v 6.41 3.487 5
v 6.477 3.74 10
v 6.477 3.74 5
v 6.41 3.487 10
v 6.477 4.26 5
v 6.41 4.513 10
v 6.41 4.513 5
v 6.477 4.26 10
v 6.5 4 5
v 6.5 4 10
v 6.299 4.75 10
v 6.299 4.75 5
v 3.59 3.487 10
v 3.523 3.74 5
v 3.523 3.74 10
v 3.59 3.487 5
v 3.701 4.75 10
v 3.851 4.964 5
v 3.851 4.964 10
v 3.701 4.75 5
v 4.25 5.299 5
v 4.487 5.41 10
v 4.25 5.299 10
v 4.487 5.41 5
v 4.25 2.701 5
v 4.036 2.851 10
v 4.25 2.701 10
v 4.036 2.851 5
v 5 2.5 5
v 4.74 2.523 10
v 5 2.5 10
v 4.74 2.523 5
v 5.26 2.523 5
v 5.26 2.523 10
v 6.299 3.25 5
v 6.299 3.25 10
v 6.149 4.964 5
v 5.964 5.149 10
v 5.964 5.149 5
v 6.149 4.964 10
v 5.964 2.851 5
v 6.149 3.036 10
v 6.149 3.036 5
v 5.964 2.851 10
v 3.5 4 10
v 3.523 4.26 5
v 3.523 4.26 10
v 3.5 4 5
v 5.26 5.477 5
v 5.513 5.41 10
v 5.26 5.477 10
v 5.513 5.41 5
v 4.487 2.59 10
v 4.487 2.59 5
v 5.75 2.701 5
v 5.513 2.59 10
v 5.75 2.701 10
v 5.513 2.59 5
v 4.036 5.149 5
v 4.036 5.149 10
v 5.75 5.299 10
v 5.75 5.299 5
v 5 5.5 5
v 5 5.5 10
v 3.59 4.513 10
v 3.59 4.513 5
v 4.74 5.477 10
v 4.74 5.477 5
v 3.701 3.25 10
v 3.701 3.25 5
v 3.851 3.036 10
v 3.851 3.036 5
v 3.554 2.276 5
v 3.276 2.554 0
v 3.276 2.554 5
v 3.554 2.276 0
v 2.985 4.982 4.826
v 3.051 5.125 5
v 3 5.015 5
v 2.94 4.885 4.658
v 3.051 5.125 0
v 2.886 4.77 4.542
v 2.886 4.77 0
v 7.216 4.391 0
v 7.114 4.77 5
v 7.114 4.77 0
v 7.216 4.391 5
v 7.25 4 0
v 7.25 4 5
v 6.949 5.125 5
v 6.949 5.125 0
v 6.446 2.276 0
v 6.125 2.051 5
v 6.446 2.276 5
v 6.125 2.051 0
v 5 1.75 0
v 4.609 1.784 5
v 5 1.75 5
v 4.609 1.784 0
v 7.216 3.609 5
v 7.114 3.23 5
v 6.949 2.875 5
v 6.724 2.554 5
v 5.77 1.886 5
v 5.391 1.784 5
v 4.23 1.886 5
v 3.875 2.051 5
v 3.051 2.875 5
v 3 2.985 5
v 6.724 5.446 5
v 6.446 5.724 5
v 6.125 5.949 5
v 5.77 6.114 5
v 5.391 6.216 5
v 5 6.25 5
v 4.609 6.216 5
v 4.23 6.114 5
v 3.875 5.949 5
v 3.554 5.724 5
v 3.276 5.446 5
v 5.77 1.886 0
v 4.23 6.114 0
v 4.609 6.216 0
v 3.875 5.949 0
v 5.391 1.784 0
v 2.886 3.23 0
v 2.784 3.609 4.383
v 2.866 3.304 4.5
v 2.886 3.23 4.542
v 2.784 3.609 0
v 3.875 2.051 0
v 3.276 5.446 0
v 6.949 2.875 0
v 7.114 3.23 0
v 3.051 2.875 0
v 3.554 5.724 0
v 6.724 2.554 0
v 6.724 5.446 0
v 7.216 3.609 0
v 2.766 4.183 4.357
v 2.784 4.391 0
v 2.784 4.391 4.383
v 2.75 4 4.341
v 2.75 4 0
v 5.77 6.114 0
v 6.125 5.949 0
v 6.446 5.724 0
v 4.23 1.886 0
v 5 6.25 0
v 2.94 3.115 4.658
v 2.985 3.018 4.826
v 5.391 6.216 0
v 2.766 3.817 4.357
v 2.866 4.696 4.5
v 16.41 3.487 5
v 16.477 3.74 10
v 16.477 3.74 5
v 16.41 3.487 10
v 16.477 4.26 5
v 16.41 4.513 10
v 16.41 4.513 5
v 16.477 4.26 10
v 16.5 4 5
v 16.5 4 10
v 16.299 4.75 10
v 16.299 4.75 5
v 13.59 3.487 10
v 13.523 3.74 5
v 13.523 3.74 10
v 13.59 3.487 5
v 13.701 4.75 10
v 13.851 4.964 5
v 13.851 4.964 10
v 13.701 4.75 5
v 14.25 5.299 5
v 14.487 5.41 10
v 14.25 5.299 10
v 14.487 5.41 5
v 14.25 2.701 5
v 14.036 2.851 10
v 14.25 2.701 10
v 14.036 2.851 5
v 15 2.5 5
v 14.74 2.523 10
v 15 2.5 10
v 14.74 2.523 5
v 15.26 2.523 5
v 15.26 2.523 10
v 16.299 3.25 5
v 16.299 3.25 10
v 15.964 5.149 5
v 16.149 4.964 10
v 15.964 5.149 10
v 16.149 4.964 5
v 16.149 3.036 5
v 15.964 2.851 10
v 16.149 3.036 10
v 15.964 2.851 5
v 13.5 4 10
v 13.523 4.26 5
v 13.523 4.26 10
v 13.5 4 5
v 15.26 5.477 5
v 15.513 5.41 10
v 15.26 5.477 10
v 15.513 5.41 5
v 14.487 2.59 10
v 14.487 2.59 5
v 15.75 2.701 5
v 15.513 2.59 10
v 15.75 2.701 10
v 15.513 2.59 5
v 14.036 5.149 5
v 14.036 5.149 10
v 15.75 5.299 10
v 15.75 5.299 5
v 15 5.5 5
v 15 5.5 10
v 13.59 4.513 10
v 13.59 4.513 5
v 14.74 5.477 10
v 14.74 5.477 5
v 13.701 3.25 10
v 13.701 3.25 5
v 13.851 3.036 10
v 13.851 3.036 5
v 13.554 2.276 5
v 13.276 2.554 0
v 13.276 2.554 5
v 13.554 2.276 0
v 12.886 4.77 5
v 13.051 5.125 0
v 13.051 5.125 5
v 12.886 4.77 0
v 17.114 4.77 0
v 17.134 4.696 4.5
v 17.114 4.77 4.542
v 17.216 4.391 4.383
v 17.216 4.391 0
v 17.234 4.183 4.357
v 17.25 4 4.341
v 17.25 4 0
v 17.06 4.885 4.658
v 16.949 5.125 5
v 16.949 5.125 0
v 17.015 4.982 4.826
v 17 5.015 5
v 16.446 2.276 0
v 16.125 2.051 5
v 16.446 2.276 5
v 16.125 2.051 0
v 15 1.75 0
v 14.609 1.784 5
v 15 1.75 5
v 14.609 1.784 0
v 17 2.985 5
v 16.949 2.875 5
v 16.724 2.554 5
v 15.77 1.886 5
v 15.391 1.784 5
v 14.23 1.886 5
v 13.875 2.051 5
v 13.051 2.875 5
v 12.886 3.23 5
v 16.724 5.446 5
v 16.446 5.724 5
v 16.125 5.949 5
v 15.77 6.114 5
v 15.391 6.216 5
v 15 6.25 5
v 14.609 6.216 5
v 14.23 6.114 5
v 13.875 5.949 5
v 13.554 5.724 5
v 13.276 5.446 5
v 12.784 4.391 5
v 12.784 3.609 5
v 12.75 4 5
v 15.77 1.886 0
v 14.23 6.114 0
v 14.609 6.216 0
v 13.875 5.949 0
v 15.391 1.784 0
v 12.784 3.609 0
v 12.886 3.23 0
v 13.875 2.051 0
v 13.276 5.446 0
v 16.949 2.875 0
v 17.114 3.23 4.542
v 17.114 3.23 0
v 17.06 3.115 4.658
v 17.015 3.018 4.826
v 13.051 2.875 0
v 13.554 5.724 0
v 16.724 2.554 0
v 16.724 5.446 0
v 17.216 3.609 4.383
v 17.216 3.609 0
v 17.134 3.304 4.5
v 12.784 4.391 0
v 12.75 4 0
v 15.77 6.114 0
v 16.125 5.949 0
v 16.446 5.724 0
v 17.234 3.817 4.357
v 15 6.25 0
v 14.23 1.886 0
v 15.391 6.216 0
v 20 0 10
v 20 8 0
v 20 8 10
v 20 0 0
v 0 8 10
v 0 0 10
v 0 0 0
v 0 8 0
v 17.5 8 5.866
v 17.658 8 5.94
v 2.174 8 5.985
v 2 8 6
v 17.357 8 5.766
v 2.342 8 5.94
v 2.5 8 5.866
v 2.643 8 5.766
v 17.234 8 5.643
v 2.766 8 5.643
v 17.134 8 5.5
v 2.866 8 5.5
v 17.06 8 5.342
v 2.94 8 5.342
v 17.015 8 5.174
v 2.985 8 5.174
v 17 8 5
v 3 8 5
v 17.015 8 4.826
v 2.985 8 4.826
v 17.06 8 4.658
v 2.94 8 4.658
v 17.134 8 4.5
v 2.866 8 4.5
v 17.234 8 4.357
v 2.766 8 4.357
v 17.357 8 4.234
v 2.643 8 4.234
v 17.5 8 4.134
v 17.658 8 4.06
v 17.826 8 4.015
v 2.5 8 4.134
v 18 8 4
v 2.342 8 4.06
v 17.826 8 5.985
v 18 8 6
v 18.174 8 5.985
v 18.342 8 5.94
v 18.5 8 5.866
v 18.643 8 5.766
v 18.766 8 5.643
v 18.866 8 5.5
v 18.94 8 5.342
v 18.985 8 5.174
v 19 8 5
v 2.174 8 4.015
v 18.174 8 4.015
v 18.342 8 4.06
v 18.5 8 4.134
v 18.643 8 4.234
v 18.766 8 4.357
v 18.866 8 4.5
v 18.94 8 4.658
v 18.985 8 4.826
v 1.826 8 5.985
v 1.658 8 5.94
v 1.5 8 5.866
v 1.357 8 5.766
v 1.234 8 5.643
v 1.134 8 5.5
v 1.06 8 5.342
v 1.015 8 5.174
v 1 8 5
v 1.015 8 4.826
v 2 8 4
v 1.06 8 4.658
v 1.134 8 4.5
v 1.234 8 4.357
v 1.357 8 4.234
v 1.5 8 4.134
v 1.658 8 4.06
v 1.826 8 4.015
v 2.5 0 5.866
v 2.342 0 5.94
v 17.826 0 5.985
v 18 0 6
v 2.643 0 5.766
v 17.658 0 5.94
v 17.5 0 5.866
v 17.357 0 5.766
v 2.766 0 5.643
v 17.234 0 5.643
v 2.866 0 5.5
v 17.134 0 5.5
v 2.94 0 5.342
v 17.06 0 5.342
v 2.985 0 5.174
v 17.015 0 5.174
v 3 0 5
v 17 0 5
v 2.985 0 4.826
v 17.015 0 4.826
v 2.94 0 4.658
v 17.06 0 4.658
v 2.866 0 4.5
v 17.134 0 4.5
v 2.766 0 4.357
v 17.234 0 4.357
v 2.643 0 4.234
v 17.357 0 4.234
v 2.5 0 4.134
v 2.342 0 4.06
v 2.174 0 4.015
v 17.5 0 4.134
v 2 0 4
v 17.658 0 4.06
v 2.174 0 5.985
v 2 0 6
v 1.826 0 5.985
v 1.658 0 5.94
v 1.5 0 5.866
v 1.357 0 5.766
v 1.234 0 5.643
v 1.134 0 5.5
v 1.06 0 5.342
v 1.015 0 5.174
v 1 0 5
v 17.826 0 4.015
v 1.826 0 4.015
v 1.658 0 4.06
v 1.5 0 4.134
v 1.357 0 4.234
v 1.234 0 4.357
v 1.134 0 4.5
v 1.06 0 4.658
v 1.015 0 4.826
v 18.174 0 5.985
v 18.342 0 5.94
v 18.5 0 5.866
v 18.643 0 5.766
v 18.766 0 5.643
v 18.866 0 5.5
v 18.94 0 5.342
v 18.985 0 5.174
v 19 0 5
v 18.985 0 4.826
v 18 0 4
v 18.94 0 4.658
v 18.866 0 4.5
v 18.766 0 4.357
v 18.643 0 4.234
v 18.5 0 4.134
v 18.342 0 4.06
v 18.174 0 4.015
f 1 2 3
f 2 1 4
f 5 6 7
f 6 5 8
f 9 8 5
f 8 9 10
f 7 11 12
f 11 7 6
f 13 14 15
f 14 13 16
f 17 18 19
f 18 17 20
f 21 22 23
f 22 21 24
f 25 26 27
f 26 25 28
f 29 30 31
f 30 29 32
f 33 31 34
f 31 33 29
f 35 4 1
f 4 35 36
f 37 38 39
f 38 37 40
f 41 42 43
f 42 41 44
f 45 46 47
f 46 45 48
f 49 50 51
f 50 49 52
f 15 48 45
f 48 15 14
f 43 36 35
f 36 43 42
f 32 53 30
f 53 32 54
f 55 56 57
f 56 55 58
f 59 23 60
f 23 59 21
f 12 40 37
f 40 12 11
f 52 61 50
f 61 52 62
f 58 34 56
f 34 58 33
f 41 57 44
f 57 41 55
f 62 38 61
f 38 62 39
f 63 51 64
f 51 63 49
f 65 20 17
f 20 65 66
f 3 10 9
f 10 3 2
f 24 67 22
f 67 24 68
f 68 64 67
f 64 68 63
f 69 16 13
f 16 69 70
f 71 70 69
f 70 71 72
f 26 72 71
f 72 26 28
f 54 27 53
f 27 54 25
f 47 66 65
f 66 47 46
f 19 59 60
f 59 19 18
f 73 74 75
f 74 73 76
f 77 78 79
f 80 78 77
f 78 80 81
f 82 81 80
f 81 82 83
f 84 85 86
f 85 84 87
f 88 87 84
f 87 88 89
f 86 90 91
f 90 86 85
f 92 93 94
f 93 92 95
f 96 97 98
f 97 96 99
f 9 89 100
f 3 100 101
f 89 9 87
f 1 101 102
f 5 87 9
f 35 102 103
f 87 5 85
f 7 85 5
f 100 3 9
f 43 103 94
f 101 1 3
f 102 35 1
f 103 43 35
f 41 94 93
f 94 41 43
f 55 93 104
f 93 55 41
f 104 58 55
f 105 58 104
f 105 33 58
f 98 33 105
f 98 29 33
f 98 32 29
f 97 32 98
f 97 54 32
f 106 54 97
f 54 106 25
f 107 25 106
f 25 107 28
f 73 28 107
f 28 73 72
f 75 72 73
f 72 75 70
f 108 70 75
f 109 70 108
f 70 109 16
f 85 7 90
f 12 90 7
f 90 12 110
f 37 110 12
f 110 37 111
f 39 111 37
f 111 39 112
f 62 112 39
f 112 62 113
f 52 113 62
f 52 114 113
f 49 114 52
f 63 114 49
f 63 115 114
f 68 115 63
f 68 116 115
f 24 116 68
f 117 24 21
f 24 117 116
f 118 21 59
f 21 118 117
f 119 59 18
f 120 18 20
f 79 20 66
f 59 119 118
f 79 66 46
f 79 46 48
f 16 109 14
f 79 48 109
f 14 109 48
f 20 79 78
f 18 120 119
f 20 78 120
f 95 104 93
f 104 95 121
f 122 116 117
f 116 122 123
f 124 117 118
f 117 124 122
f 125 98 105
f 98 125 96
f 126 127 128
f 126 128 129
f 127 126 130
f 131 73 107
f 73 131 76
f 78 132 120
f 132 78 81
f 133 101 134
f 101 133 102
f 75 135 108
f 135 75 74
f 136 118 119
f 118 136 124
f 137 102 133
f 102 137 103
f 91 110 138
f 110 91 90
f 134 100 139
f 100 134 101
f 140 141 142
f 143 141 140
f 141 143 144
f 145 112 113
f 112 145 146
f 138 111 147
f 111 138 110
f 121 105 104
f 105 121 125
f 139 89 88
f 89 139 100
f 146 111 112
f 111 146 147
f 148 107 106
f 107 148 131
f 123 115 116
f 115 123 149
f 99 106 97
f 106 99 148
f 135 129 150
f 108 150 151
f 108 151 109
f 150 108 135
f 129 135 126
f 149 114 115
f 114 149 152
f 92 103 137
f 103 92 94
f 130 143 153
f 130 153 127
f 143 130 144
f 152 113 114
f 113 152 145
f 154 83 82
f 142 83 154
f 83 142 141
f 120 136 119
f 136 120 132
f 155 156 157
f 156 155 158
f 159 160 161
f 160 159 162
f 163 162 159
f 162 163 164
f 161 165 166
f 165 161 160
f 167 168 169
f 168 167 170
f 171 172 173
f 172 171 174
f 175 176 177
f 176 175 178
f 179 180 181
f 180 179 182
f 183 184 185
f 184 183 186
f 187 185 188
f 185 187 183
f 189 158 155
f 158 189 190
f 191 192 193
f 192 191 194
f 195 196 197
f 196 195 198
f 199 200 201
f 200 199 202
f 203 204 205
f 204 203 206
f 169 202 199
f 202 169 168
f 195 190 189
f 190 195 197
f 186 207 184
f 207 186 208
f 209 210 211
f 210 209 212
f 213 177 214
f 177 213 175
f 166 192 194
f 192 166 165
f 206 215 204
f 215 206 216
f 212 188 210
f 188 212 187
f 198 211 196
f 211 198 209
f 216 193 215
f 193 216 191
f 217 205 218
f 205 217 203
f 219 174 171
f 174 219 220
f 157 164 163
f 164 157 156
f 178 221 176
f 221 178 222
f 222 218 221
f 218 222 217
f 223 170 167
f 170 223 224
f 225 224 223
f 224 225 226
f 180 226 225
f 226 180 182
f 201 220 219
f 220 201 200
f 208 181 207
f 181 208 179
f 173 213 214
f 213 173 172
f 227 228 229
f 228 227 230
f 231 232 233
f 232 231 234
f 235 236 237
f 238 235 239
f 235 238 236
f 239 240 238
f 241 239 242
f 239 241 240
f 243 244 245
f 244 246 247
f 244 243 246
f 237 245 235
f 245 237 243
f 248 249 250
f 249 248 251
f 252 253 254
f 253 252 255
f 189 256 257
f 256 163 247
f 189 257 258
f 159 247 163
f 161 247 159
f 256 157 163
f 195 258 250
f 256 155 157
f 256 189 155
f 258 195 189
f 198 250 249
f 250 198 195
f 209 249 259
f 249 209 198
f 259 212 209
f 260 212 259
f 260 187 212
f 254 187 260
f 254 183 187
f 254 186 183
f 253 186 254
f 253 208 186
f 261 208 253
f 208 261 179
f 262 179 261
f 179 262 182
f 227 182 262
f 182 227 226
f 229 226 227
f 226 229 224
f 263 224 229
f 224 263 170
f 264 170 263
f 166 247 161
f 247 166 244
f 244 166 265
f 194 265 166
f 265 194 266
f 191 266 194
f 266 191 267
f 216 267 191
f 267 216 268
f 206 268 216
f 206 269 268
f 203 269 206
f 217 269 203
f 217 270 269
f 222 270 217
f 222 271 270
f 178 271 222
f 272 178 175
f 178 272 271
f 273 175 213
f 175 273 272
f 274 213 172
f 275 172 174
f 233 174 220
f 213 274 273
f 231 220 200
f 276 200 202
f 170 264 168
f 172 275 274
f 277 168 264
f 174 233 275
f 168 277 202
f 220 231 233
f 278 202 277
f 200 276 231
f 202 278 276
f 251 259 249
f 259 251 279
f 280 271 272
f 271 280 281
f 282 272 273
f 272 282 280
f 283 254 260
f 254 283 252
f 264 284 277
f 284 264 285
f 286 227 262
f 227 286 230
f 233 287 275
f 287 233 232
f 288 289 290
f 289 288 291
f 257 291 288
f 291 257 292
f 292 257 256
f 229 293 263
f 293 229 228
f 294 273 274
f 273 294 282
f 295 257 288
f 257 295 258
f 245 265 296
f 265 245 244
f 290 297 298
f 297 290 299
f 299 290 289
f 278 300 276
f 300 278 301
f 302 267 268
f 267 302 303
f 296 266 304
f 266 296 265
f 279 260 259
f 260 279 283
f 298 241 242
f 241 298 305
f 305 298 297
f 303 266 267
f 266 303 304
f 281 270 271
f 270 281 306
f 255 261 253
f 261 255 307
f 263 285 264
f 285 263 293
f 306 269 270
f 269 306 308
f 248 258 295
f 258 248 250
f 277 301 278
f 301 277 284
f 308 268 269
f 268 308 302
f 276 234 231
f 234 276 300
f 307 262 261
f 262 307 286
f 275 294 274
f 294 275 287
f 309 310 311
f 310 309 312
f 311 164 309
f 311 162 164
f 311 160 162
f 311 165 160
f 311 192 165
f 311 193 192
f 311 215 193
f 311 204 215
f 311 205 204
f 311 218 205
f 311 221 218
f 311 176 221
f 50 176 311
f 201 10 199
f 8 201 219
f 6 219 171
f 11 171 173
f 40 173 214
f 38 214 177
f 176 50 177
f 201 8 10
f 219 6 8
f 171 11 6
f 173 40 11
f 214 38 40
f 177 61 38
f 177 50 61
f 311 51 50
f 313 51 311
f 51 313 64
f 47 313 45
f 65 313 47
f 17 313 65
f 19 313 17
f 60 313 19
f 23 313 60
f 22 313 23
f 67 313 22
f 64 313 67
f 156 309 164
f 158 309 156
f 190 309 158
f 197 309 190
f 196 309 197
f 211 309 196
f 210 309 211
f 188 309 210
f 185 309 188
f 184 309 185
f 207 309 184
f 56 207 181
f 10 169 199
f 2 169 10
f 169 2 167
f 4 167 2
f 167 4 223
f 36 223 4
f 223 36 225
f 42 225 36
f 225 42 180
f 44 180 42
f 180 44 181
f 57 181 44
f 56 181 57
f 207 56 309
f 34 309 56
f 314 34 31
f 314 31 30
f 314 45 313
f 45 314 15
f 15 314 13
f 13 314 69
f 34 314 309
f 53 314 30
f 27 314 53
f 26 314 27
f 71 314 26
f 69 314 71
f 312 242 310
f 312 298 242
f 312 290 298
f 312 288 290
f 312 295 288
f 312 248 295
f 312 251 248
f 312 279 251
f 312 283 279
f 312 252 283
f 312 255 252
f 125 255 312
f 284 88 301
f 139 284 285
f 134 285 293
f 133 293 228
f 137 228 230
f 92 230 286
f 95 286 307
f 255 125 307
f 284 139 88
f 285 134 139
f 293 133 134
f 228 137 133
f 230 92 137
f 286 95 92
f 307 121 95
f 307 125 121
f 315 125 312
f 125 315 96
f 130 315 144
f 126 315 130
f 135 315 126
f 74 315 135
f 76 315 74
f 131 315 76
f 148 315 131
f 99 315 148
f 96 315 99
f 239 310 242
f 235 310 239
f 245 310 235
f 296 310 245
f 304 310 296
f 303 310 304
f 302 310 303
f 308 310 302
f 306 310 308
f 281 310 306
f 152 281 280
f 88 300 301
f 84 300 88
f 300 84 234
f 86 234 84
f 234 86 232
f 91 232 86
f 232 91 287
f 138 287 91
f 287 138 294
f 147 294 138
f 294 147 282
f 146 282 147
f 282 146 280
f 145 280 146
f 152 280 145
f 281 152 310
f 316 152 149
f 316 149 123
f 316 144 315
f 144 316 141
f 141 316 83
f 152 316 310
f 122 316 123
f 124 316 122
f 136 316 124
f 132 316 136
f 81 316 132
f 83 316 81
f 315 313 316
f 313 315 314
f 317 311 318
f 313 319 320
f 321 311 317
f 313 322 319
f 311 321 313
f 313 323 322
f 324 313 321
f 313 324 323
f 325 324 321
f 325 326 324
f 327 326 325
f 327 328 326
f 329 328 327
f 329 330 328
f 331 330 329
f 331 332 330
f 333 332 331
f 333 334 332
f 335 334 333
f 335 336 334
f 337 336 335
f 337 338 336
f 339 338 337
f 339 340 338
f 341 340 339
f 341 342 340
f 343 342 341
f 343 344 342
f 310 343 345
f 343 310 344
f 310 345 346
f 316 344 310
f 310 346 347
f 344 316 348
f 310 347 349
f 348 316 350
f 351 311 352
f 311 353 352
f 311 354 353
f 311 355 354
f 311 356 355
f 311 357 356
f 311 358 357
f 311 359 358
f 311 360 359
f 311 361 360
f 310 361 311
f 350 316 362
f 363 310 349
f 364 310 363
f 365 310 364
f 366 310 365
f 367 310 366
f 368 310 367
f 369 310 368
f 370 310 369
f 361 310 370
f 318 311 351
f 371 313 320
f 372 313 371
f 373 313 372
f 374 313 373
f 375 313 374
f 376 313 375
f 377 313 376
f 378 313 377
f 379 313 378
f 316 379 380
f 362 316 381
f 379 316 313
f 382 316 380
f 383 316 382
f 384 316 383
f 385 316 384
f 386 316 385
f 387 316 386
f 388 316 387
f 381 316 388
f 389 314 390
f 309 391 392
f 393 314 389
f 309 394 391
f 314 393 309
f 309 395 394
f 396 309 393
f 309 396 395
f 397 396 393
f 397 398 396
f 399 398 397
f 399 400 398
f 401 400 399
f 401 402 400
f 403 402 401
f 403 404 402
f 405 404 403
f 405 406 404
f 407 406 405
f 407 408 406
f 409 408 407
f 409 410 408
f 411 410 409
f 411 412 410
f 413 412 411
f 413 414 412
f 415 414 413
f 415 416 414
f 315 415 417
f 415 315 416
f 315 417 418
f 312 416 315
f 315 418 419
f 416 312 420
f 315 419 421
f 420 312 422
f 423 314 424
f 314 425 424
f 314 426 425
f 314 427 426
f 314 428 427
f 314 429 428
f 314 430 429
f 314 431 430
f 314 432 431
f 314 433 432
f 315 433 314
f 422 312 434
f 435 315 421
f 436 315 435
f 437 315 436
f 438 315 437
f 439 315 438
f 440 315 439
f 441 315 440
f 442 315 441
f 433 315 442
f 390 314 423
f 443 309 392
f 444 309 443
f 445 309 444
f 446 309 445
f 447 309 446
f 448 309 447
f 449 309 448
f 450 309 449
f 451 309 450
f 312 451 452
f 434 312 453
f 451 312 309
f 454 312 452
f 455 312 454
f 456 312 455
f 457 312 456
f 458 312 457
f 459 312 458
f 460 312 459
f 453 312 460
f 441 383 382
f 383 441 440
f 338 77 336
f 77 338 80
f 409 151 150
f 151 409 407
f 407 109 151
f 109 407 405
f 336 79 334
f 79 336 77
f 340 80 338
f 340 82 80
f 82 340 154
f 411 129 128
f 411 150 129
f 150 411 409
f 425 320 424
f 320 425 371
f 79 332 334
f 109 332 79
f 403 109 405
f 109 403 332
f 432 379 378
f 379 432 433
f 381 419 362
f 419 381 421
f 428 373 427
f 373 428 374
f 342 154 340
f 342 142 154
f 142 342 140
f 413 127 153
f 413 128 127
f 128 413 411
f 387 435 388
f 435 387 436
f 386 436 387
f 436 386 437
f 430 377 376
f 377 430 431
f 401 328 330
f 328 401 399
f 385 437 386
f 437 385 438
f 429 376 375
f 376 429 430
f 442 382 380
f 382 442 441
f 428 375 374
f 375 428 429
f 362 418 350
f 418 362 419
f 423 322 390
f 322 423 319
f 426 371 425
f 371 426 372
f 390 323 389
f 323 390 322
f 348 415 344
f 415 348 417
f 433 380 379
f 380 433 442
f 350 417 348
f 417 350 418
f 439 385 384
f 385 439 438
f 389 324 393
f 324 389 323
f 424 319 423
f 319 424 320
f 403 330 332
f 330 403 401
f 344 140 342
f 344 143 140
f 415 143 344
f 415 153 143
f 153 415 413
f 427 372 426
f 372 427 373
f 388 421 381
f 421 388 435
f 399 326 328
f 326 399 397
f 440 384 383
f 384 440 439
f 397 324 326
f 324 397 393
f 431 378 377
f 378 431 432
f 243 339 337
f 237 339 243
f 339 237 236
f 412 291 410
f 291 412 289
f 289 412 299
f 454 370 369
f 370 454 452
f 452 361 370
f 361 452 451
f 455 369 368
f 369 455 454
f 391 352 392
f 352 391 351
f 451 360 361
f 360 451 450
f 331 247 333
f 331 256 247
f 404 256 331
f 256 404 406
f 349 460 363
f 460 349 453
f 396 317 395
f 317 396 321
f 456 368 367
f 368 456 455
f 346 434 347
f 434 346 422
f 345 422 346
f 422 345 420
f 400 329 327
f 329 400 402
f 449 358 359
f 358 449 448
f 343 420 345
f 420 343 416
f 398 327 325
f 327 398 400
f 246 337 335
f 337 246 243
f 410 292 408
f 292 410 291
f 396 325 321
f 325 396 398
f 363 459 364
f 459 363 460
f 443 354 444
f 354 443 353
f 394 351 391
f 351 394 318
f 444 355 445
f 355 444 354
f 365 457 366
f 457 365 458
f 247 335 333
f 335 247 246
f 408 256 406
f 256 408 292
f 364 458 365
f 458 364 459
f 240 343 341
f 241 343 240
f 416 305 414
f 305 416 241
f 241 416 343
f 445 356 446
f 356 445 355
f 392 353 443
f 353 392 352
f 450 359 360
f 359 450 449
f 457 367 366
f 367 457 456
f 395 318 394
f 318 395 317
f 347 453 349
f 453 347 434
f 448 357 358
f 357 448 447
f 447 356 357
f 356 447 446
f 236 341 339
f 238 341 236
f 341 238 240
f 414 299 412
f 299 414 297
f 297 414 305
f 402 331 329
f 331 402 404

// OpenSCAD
difference()
{
  cube([20,8,10]);
  translate([5,4,-1])
  {
     cylinder(h=12,d=3, $fn=36);
     cylinder(h=6,d=4.5, $fn=36);
  }
  translate([15,4,-1])
  {
     cylinder(h=12,d=3, $fn=36);
     cylinder(h=6,d=4.5, $fn=36);
  }
  translate([2,-1,5])
    rotate([-90,0,0]) cylinder(h=10,d=2, $fn=36);
  translate([20-2,-1,5])
    rotate([-90,0,0]) cylinder(h=10,d=2, $fn=36);
}
